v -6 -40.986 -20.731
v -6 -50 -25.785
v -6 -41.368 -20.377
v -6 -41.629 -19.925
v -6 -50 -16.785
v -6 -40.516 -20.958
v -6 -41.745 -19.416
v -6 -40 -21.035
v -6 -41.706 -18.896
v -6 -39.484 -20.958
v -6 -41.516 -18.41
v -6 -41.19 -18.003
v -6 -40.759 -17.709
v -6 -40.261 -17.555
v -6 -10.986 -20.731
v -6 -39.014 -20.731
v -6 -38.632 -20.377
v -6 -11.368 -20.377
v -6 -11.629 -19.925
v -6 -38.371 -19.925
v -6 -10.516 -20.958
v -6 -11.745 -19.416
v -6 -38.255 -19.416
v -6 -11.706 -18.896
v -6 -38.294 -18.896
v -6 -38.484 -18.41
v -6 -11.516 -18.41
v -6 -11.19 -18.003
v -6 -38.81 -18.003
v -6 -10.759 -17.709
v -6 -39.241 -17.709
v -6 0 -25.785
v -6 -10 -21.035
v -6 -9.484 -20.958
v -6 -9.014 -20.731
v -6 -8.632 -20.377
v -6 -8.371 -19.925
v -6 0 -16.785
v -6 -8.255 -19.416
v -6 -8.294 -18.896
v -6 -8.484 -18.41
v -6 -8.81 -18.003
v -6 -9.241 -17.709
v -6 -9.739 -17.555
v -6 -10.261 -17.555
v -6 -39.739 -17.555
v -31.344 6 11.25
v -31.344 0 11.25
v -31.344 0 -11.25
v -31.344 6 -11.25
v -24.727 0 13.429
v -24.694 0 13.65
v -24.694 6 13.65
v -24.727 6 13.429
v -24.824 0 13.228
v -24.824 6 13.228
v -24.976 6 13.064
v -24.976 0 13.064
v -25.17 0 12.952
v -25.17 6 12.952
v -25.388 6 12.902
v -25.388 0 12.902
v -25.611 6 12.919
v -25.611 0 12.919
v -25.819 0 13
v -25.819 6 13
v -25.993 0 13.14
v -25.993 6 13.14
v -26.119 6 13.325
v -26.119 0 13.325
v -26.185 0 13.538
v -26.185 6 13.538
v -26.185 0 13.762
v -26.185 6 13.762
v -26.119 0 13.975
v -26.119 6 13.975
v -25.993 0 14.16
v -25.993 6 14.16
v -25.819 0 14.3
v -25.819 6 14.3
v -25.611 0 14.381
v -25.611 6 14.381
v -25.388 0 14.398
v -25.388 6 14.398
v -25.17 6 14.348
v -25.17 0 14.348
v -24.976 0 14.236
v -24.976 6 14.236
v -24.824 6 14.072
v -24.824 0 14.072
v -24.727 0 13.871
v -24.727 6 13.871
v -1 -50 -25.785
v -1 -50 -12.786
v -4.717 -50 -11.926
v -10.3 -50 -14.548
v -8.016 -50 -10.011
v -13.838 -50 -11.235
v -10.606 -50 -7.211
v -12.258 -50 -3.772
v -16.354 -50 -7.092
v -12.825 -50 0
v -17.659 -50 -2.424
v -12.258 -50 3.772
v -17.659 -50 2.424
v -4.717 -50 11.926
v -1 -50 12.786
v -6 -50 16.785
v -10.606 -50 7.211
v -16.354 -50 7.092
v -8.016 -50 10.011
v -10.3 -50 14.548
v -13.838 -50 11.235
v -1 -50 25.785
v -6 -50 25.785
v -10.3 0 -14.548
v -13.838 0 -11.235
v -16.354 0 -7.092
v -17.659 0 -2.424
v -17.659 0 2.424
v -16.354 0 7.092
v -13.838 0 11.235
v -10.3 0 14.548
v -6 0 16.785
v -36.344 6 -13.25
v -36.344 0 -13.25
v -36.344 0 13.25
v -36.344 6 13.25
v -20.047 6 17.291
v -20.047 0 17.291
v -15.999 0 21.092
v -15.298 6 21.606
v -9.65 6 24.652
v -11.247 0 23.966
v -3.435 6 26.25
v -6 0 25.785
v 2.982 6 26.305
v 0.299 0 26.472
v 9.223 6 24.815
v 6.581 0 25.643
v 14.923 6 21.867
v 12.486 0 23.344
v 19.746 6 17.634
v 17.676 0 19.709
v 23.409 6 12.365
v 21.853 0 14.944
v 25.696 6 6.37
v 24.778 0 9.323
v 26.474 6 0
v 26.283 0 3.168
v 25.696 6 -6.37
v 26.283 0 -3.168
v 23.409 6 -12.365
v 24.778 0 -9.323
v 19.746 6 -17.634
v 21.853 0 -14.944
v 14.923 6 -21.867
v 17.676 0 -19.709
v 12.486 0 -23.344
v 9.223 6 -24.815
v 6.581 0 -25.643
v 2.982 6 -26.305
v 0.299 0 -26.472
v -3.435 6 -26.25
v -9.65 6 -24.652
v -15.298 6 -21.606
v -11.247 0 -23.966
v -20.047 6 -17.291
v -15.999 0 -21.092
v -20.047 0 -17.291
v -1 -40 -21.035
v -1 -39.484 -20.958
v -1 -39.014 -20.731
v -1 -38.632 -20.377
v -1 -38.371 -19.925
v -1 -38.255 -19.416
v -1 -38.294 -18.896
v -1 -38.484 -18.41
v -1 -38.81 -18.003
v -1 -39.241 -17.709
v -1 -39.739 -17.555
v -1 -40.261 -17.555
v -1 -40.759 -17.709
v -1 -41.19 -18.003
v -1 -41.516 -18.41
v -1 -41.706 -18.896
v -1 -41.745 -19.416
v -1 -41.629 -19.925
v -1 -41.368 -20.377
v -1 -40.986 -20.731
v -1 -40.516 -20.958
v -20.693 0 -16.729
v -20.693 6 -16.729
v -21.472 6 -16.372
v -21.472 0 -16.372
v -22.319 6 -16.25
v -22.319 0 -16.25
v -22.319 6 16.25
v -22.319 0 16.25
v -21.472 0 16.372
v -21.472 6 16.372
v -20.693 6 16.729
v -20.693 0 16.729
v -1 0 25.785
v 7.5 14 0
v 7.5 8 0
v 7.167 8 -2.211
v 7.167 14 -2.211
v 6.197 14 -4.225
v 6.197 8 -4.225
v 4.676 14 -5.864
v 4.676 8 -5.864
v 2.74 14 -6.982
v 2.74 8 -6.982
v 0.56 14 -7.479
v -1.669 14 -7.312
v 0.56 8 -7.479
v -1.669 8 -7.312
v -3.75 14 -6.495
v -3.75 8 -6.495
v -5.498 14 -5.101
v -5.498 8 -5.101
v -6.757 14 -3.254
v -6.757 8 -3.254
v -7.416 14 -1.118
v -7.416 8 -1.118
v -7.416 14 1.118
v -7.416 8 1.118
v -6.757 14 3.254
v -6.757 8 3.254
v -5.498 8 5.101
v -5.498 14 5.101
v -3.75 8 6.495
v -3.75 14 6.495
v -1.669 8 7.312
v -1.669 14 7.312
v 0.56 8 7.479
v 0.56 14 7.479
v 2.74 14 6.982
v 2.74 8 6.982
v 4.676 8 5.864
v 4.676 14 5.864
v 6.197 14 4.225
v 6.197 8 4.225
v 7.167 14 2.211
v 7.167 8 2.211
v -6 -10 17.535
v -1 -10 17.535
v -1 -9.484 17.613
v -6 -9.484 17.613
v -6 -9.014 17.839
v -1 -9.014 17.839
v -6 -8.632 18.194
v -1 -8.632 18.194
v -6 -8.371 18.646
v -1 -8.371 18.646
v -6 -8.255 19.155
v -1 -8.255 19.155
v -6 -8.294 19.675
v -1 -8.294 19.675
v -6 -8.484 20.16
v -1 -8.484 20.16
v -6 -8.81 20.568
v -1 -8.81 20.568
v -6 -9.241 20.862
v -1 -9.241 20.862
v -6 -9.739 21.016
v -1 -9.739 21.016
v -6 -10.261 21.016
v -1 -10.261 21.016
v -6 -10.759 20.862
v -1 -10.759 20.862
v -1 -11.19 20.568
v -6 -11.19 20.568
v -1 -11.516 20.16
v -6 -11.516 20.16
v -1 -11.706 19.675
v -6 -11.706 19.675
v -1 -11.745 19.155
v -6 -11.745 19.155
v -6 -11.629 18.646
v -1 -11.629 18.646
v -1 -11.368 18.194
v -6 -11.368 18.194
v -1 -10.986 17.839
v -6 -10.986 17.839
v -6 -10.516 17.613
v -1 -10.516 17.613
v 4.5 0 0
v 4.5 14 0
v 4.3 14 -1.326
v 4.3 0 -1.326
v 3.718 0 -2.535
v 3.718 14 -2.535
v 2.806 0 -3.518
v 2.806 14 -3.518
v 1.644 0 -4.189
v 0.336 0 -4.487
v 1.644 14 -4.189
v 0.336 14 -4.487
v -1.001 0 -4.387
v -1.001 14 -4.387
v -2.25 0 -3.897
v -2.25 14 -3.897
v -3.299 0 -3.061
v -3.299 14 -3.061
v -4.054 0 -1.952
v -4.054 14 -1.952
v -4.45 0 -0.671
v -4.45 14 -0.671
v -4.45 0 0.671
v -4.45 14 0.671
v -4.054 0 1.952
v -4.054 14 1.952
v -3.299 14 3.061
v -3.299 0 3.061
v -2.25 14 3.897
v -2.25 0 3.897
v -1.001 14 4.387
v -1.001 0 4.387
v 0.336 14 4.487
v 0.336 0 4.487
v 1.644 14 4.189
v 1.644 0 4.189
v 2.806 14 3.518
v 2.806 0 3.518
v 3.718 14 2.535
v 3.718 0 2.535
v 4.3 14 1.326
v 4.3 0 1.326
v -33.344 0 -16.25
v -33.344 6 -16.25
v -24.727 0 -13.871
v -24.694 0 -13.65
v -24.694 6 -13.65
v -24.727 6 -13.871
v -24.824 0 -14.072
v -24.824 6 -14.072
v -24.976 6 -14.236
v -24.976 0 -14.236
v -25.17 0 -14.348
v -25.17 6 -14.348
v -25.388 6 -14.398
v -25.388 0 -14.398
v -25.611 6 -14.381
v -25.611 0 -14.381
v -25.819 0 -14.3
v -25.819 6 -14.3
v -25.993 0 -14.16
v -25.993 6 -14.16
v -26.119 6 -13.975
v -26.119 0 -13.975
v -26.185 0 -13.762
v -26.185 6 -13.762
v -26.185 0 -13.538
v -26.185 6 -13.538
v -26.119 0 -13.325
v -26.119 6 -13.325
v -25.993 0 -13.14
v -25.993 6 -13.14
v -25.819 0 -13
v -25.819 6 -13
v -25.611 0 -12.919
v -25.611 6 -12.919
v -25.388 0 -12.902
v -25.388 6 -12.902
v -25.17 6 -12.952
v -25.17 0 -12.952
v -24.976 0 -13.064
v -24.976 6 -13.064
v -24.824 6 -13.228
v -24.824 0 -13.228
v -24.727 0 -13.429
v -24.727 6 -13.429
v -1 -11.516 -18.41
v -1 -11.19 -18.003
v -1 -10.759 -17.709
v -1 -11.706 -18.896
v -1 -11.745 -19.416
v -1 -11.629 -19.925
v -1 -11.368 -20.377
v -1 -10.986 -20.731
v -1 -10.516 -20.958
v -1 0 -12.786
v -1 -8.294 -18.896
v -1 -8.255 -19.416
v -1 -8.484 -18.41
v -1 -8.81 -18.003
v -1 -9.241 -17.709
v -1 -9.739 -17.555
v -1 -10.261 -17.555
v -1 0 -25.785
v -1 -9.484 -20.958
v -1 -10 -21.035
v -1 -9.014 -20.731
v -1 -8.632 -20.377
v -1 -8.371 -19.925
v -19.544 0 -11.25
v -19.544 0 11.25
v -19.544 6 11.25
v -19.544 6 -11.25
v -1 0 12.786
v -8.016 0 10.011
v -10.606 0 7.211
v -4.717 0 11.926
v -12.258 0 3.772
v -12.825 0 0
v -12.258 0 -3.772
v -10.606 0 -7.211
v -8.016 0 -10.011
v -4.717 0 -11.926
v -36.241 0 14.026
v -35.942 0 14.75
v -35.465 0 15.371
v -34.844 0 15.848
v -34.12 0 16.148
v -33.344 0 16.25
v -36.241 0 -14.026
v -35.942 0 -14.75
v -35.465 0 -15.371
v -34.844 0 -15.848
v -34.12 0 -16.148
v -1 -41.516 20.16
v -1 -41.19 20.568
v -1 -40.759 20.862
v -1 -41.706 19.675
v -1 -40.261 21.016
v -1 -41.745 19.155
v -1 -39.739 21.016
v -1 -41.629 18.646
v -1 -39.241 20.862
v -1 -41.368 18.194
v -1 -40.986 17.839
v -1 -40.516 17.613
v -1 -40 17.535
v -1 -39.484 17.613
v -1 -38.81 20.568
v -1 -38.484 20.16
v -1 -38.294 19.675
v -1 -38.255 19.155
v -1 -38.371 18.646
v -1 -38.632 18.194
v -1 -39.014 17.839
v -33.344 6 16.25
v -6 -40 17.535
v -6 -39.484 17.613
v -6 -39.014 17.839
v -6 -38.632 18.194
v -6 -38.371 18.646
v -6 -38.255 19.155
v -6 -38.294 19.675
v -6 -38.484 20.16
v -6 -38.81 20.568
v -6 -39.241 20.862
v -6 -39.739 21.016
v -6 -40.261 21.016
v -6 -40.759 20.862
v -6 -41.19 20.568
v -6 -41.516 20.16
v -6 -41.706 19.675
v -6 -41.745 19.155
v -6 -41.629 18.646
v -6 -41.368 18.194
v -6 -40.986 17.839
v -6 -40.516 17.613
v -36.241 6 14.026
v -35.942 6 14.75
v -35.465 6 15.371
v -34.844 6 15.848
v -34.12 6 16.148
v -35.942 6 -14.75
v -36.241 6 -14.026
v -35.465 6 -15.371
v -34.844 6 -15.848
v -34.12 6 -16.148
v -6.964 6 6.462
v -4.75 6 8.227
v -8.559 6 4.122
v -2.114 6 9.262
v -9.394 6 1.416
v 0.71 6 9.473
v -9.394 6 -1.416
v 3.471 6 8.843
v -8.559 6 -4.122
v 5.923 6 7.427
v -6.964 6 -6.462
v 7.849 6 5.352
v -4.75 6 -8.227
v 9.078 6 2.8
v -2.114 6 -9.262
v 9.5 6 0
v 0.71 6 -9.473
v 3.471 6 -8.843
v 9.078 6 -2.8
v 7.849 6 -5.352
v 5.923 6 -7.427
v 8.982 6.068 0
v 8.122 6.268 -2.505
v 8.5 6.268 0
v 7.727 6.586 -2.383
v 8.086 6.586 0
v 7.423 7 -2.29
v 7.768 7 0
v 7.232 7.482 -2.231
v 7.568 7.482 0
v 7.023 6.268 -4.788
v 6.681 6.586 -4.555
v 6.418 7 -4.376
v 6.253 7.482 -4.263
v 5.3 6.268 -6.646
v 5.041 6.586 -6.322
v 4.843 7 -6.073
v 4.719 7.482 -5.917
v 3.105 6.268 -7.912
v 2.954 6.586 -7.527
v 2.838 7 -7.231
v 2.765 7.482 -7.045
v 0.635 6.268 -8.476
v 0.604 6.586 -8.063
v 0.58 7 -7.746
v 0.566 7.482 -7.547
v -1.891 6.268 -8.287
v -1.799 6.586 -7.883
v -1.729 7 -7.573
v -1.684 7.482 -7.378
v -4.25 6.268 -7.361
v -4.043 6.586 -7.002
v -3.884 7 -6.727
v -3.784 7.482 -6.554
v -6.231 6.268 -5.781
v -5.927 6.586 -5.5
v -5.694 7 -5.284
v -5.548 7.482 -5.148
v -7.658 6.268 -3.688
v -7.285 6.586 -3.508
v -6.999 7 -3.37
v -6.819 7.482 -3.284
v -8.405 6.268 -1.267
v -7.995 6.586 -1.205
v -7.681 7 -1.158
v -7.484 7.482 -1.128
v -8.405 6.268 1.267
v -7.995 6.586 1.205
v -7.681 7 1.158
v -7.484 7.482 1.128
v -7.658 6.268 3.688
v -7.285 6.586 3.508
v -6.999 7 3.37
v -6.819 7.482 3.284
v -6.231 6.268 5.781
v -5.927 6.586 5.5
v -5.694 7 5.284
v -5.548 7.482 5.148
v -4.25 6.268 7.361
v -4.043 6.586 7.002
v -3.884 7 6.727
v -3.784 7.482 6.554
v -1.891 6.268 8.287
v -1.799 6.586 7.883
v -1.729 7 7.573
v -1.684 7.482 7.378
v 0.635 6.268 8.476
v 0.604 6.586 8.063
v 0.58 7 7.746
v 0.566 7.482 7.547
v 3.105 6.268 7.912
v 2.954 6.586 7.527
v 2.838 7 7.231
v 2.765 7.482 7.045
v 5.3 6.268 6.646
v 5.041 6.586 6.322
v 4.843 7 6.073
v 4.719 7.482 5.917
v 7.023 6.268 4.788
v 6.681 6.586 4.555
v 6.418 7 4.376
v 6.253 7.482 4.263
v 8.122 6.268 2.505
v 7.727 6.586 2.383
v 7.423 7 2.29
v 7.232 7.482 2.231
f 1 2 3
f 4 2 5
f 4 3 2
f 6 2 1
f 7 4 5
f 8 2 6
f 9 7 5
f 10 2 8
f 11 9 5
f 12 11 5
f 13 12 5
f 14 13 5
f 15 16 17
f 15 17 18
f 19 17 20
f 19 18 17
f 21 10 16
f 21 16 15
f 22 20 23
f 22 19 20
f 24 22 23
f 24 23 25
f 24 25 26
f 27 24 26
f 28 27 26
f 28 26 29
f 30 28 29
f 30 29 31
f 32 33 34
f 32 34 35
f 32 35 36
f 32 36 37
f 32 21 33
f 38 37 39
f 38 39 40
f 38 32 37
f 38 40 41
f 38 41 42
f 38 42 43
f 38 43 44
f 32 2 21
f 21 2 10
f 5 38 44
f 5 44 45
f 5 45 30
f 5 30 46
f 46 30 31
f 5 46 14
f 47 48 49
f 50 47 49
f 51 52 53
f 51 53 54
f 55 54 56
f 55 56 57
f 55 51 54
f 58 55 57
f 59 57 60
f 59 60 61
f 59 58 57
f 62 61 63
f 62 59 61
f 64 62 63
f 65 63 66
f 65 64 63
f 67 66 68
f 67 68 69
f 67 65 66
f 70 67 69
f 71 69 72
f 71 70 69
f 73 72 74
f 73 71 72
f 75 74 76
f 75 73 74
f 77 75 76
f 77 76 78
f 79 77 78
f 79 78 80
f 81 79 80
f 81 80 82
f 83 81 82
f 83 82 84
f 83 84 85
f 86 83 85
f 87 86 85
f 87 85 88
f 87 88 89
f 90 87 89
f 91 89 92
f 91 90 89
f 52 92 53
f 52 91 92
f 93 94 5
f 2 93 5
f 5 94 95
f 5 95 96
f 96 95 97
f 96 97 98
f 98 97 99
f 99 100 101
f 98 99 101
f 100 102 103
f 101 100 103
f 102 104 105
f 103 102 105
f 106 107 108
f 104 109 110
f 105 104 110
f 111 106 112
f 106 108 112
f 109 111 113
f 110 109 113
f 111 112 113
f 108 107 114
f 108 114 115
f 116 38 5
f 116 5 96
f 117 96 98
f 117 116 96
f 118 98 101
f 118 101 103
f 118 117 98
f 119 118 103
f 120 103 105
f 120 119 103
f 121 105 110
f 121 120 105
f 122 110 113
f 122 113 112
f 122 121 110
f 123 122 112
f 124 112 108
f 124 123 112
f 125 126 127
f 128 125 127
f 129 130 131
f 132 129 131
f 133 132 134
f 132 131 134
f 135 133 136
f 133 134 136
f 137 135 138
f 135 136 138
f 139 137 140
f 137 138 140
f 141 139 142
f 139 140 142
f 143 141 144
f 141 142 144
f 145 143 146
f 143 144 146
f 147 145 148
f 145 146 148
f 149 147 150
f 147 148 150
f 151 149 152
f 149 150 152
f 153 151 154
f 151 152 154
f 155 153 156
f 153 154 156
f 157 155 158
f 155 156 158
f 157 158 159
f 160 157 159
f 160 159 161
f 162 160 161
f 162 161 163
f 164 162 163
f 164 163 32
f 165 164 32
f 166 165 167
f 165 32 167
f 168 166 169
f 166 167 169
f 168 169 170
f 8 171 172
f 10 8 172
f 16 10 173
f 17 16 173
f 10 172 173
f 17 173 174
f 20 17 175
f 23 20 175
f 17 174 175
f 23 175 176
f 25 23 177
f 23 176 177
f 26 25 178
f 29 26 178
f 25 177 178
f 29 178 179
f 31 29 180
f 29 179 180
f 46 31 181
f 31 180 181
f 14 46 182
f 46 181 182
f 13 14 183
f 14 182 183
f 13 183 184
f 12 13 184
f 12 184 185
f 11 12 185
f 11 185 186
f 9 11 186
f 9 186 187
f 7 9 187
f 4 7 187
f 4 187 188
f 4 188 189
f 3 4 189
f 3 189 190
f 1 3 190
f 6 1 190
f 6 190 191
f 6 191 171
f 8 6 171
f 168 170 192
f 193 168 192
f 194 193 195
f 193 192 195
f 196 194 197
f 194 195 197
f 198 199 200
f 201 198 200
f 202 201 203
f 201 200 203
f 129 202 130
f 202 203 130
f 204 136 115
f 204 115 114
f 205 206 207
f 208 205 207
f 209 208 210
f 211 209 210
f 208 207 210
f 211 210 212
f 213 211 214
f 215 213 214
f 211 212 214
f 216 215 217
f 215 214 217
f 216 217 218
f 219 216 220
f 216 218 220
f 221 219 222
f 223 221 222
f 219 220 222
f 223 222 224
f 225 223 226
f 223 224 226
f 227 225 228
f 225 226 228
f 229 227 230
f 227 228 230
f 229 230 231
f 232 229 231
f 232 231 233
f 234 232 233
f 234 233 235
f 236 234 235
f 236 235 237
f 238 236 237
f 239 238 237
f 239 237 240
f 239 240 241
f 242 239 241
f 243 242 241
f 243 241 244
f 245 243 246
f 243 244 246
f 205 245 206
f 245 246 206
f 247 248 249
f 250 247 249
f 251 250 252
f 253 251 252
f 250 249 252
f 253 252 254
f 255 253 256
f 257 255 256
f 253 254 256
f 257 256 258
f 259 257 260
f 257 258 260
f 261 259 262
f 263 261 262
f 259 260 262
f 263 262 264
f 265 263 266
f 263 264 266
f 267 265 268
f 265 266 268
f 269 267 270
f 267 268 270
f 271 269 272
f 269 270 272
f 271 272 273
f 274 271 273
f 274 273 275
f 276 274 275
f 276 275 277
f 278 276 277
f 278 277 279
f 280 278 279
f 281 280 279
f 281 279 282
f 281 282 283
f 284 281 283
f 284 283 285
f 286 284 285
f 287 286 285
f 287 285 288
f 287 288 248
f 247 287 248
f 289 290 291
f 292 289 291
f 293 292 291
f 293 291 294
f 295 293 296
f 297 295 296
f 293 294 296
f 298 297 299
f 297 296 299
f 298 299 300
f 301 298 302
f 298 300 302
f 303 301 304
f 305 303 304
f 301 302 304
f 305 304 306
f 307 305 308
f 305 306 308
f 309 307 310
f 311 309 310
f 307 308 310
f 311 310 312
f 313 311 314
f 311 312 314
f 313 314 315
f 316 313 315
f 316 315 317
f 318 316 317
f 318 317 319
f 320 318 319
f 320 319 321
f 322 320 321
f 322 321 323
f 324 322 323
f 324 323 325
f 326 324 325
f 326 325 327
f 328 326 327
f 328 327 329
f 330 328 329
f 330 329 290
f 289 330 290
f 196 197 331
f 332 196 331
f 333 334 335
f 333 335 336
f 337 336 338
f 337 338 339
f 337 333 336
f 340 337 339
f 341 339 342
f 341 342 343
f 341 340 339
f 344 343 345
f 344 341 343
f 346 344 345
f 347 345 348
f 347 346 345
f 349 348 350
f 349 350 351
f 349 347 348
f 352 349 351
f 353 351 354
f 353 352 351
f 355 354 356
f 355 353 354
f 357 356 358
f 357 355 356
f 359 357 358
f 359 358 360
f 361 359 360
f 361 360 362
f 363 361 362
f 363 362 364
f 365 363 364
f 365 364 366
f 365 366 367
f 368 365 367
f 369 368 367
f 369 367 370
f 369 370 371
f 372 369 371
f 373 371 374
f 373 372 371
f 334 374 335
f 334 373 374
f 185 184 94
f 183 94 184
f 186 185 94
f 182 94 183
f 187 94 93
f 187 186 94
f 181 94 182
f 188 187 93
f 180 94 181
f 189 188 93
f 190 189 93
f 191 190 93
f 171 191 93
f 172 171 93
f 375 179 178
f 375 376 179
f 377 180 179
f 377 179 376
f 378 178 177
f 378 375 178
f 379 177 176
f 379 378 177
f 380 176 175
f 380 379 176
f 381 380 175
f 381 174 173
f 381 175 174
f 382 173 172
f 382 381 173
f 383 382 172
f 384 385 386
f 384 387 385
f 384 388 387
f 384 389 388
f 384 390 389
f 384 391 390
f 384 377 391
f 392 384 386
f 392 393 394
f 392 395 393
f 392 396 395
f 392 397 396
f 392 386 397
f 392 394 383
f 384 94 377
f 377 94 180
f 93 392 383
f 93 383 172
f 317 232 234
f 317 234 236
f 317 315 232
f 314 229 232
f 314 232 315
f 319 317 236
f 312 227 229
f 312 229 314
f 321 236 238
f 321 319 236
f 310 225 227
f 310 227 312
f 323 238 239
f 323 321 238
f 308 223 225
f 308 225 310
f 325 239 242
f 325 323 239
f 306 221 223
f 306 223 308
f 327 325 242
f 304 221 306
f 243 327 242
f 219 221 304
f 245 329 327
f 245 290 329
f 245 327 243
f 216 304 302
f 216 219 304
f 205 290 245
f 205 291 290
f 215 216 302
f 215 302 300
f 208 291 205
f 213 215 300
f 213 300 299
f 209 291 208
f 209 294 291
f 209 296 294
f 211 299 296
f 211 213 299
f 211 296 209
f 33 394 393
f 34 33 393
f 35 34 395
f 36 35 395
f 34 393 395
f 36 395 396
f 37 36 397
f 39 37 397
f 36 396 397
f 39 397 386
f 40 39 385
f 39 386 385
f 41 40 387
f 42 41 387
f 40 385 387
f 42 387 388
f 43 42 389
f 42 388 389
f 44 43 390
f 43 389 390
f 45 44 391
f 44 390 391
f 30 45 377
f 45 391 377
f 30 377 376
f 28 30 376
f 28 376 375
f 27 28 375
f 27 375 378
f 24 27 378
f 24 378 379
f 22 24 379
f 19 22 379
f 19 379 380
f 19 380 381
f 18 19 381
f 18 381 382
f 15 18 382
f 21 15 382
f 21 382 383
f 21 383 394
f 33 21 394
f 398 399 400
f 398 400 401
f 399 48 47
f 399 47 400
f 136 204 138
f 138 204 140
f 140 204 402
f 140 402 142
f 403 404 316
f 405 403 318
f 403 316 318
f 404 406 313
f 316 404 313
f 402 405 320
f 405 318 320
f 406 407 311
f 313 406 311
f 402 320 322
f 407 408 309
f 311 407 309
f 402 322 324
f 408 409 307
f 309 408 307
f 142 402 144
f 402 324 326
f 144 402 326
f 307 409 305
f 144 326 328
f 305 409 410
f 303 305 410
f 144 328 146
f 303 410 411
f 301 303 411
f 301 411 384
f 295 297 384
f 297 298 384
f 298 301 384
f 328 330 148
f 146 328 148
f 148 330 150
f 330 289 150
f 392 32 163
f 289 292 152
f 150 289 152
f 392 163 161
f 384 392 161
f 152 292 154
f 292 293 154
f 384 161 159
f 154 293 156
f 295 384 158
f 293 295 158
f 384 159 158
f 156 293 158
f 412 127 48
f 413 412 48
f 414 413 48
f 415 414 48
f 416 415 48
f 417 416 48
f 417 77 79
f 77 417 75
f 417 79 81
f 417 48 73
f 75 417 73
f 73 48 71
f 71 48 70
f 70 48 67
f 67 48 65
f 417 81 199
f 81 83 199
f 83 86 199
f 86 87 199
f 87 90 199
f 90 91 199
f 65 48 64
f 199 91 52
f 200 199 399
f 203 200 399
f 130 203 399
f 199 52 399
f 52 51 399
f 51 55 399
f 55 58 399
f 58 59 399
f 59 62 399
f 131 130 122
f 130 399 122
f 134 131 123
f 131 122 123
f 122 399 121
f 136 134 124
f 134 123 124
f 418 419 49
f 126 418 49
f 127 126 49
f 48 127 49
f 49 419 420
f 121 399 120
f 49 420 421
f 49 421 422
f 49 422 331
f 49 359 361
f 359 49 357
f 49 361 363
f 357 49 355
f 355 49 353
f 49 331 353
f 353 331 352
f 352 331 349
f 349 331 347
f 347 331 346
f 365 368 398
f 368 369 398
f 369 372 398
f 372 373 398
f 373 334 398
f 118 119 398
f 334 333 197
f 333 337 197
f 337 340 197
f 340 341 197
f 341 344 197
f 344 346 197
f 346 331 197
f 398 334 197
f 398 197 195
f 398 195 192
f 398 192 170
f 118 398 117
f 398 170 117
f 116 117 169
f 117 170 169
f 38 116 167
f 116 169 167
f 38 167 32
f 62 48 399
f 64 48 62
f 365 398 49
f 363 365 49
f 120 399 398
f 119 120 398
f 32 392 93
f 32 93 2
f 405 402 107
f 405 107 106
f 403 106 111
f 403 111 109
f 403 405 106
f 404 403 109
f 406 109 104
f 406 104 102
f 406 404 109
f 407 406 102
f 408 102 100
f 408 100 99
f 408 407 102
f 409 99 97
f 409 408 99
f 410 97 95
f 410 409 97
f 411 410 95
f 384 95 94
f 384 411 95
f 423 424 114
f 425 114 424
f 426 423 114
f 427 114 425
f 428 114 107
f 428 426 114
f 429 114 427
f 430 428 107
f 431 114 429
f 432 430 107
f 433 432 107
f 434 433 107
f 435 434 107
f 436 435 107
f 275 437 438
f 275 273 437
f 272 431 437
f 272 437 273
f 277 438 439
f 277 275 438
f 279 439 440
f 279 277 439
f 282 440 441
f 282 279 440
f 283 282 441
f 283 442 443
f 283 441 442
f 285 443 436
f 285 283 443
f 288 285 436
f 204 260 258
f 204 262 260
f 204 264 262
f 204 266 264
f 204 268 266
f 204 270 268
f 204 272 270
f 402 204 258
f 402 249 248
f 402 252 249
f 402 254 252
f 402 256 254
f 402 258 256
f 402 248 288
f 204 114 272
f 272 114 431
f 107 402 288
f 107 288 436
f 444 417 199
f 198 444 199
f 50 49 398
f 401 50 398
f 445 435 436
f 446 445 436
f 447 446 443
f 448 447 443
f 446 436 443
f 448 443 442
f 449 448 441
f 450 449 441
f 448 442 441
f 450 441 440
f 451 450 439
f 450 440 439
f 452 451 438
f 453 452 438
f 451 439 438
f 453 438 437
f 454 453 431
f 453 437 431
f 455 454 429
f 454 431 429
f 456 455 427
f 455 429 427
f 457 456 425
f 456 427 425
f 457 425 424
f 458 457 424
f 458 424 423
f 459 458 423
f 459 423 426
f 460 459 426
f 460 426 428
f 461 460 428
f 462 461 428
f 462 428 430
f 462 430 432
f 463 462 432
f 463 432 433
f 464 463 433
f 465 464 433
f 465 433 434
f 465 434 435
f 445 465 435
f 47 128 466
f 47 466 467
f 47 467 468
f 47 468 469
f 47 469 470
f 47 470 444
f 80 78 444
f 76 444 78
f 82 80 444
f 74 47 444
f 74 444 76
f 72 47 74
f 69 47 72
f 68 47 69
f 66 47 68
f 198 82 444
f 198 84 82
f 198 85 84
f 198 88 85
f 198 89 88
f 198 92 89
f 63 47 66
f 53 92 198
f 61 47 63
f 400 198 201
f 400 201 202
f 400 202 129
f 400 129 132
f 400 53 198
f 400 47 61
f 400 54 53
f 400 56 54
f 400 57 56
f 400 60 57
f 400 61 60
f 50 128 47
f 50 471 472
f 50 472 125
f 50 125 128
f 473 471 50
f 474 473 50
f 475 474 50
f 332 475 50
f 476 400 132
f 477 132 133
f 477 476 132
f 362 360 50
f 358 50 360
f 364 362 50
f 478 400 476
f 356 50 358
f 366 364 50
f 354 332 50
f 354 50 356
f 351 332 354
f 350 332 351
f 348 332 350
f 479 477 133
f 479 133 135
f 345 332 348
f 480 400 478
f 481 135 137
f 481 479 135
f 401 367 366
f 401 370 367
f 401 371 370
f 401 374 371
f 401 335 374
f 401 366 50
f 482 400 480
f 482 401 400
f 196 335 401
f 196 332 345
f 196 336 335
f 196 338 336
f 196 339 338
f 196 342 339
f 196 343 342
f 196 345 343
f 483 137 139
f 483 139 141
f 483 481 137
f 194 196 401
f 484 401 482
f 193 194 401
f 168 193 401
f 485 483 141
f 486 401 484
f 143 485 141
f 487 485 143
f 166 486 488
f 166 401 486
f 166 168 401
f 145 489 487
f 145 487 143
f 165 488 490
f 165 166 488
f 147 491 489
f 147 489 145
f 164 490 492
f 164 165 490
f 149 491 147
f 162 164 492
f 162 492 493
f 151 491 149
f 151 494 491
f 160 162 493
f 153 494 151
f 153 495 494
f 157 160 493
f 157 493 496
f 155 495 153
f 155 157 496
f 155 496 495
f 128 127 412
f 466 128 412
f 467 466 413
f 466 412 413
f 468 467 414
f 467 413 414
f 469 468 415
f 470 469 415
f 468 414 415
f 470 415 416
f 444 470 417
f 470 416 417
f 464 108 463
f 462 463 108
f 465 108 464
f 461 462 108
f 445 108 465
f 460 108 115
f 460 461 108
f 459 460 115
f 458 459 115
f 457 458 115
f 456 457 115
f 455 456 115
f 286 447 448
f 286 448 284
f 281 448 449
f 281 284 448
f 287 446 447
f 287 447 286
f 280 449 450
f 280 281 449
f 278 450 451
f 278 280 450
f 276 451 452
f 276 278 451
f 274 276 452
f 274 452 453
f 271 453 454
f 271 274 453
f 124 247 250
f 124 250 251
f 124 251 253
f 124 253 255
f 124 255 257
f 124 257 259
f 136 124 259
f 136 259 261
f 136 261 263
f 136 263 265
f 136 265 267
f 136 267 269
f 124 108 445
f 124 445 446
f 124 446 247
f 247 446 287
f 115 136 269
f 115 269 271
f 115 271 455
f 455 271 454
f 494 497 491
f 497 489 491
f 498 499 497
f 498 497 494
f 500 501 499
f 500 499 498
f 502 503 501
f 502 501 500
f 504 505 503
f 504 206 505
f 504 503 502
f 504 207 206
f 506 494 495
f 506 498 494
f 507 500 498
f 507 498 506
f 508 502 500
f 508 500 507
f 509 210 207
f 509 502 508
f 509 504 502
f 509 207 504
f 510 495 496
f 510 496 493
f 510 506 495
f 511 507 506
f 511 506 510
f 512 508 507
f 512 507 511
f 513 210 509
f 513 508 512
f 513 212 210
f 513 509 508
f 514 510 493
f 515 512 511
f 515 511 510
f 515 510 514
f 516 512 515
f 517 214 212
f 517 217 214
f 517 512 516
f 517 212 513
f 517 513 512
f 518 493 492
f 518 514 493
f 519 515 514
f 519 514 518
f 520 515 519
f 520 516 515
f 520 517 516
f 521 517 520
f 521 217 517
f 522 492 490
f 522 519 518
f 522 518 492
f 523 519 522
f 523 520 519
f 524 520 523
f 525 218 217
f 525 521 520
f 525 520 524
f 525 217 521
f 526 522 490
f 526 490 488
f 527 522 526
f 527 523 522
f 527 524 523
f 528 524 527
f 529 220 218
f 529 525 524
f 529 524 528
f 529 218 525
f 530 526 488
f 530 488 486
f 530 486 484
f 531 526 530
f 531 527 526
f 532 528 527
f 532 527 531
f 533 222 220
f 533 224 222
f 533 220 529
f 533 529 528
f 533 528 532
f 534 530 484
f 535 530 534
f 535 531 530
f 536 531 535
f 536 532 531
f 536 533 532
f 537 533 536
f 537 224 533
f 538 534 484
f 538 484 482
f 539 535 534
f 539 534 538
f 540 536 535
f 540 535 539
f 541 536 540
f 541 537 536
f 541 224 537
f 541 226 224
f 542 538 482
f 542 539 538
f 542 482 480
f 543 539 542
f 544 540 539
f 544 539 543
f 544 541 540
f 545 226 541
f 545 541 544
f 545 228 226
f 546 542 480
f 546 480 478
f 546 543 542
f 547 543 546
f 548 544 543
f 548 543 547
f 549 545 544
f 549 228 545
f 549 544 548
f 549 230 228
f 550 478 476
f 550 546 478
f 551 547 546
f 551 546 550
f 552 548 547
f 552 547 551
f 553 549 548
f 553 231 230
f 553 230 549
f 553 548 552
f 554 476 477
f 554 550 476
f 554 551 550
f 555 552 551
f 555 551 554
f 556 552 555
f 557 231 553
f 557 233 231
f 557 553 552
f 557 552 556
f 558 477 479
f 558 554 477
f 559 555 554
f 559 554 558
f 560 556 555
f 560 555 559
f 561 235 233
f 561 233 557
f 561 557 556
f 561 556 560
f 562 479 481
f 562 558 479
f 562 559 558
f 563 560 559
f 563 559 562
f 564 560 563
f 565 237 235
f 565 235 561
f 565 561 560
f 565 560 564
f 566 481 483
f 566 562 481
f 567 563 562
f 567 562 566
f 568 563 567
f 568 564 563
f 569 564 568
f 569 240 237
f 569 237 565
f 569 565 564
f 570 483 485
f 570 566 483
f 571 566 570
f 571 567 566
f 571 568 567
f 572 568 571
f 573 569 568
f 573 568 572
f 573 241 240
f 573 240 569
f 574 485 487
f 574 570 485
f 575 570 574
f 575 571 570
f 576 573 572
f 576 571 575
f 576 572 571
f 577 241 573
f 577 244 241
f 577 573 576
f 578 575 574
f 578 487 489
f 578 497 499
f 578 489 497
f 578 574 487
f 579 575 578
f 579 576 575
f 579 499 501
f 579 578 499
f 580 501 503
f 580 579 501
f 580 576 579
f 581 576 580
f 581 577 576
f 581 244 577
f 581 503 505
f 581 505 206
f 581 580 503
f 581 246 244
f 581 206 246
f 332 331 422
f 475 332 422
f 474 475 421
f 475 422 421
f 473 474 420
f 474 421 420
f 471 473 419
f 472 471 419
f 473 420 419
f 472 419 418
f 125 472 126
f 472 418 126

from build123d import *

# Parameters (mm, degrees)
BOSS_EXTRUDE4_DEPTH = 50
SKETCH7_R           = 1.75
CUT_EXTRUDE1_DEPTH  = 17.825
SKETCH8_R           = 0.75
SKETCH8_W           = 11.8
SKETCH8_H           = 22.5
BOSS_EXTRUDE5_DEPTH = 6
SKETCH9_R           = 7.5
BOSS_EXTRUDE6_DEPTH = 8
FILLET1_R           = 2
SKETCH10_R          = 4.5
CUT_EXTRUDE2_DEPTH  = 65


with BuildPart() as part:
    # Sketch6 → Boss-Extrude4 (new body)
    with BuildSketch(Plane.XZ):
        with BuildLine():
            Line((-1, 25.784833184), (-1, 12.785954208))
            ThreePointArc((-1, 12.785954208), (-12.825, 0), (-1, -12.785954208))
            Line((-1, -12.785954208), (-1, -25.784833184))
            Line((-1, -25.784833184), (-6, -25.784833184))
            Line((-6, -25.784833184), (-6, -16.784833184))
            ThreePointArc((-6, -16.784833184), (-17.825, 0), (-6, 16.784833184))
            Line((-6, 16.784833184), (-6, 25.784833184))
            Line((-6, 25.784833184), (-1, 25.784833184))
        make_face()
    extrude(amount=BOSS_EXTRUDE4_DEPTH)

    # Sketch7 → Cut-Extrude1 (cut, through all)
    with BuildSketch(Plane(origin=(-1, 0, 0), x_dir=(0, 0, -1), z_dir=(1, 0, 0))):
        with Locations((-19.285393696, -10)):
            Circle(SKETCH7_R)
        with Locations((-19.285393696, -40)):
            Circle(SKETCH7_R)
        with Locations((19.285393696, -40)):
            Circle(SKETCH7_R)
        with Locations((19.285393696, -10)):
            Circle(SKETCH7_R)
    extrude(amount=-CUT_EXTRUDE1_DEPTH, mode=Mode.SUBTRACT)

    # Sketch8 → Boss-Extrude5 (add)
    with BuildSketch(Plane(origin=(0, 0, 0), x_dir=(1, 0, 0), z_dir=(0, 1, 0))):
        with BuildLine():
            Line((-33.34361413, -16.25), (-22.318992281, -16.25))
            ThreePointArc((-22.318992281, -16.25), (-21.069616181, -16.522536094), (-20.047240136, -17.290627093))
            ThreePointArc((-20.047240136, -17.290627093), (26.473715688, 0), (-20.047240136, 17.290627093))
            ThreePointArc((-20.047240136, 17.290627093), (-21.069616181, 16.522536094), (-22.318992281, 16.25))
            Line((-22.318992281, 16.25), (-33.34361413, 16.25))
            ThreePointArc((-33.34361413, 16.25), (-35.464934474, 15.371320344), (-36.34361413, 13.25))
            Line((-36.34361413, 13.25), (-36.34361413, -13.25))
            ThreePointArc((-36.34361413, -13.25), (-35.464934474, -15.371320344), (-33.34361413, -16.25))
        make_face()
        with Locations((-25.44361413, 13.65)):
            Circle(SKETCH8_R, mode=Mode.SUBTRACT)
        with Locations((-25.44361413, -13.65)):
            Circle(SKETCH8_R, mode=Mode.SUBTRACT)
        with Locations((-25.44361413, 0)):
            Rectangle(SKETCH8_W, SKETCH8_H, mode=Mode.SUBTRACT)
    extrude(amount=BOSS_EXTRUDE5_DEPTH)

    # Sketch9 → Boss-Extrude6 (add)
    with BuildSketch(Plane(origin=(0, 6, 0), x_dir=(1, 0, 0), z_dir=(0, 1, 0))):
        Circle(SKETCH9_R)
    extrude(amount=BOSS_EXTRUDE6_DEPTH)

    # Fillet1
    fillet1_edges = [part.edges().sort_by_distance(p)[0] for p in [
        (-7.5, 6, 0),
    ]]
    fillet(fillet1_edges, radius=FILLET1_R)

    # Sketch10 → Cut-Extrude2 (cut, through all)
    with BuildSketch(Plane(origin=(0, 14, 0), x_dir=(1, 0, 0), z_dir=(0, 1, 0))):
        Circle(SKETCH10_R)
    extrude(amount=-CUT_EXTRUDE2_DEPTH, mode=Mode.SUBTRACT)


solid = part.part
